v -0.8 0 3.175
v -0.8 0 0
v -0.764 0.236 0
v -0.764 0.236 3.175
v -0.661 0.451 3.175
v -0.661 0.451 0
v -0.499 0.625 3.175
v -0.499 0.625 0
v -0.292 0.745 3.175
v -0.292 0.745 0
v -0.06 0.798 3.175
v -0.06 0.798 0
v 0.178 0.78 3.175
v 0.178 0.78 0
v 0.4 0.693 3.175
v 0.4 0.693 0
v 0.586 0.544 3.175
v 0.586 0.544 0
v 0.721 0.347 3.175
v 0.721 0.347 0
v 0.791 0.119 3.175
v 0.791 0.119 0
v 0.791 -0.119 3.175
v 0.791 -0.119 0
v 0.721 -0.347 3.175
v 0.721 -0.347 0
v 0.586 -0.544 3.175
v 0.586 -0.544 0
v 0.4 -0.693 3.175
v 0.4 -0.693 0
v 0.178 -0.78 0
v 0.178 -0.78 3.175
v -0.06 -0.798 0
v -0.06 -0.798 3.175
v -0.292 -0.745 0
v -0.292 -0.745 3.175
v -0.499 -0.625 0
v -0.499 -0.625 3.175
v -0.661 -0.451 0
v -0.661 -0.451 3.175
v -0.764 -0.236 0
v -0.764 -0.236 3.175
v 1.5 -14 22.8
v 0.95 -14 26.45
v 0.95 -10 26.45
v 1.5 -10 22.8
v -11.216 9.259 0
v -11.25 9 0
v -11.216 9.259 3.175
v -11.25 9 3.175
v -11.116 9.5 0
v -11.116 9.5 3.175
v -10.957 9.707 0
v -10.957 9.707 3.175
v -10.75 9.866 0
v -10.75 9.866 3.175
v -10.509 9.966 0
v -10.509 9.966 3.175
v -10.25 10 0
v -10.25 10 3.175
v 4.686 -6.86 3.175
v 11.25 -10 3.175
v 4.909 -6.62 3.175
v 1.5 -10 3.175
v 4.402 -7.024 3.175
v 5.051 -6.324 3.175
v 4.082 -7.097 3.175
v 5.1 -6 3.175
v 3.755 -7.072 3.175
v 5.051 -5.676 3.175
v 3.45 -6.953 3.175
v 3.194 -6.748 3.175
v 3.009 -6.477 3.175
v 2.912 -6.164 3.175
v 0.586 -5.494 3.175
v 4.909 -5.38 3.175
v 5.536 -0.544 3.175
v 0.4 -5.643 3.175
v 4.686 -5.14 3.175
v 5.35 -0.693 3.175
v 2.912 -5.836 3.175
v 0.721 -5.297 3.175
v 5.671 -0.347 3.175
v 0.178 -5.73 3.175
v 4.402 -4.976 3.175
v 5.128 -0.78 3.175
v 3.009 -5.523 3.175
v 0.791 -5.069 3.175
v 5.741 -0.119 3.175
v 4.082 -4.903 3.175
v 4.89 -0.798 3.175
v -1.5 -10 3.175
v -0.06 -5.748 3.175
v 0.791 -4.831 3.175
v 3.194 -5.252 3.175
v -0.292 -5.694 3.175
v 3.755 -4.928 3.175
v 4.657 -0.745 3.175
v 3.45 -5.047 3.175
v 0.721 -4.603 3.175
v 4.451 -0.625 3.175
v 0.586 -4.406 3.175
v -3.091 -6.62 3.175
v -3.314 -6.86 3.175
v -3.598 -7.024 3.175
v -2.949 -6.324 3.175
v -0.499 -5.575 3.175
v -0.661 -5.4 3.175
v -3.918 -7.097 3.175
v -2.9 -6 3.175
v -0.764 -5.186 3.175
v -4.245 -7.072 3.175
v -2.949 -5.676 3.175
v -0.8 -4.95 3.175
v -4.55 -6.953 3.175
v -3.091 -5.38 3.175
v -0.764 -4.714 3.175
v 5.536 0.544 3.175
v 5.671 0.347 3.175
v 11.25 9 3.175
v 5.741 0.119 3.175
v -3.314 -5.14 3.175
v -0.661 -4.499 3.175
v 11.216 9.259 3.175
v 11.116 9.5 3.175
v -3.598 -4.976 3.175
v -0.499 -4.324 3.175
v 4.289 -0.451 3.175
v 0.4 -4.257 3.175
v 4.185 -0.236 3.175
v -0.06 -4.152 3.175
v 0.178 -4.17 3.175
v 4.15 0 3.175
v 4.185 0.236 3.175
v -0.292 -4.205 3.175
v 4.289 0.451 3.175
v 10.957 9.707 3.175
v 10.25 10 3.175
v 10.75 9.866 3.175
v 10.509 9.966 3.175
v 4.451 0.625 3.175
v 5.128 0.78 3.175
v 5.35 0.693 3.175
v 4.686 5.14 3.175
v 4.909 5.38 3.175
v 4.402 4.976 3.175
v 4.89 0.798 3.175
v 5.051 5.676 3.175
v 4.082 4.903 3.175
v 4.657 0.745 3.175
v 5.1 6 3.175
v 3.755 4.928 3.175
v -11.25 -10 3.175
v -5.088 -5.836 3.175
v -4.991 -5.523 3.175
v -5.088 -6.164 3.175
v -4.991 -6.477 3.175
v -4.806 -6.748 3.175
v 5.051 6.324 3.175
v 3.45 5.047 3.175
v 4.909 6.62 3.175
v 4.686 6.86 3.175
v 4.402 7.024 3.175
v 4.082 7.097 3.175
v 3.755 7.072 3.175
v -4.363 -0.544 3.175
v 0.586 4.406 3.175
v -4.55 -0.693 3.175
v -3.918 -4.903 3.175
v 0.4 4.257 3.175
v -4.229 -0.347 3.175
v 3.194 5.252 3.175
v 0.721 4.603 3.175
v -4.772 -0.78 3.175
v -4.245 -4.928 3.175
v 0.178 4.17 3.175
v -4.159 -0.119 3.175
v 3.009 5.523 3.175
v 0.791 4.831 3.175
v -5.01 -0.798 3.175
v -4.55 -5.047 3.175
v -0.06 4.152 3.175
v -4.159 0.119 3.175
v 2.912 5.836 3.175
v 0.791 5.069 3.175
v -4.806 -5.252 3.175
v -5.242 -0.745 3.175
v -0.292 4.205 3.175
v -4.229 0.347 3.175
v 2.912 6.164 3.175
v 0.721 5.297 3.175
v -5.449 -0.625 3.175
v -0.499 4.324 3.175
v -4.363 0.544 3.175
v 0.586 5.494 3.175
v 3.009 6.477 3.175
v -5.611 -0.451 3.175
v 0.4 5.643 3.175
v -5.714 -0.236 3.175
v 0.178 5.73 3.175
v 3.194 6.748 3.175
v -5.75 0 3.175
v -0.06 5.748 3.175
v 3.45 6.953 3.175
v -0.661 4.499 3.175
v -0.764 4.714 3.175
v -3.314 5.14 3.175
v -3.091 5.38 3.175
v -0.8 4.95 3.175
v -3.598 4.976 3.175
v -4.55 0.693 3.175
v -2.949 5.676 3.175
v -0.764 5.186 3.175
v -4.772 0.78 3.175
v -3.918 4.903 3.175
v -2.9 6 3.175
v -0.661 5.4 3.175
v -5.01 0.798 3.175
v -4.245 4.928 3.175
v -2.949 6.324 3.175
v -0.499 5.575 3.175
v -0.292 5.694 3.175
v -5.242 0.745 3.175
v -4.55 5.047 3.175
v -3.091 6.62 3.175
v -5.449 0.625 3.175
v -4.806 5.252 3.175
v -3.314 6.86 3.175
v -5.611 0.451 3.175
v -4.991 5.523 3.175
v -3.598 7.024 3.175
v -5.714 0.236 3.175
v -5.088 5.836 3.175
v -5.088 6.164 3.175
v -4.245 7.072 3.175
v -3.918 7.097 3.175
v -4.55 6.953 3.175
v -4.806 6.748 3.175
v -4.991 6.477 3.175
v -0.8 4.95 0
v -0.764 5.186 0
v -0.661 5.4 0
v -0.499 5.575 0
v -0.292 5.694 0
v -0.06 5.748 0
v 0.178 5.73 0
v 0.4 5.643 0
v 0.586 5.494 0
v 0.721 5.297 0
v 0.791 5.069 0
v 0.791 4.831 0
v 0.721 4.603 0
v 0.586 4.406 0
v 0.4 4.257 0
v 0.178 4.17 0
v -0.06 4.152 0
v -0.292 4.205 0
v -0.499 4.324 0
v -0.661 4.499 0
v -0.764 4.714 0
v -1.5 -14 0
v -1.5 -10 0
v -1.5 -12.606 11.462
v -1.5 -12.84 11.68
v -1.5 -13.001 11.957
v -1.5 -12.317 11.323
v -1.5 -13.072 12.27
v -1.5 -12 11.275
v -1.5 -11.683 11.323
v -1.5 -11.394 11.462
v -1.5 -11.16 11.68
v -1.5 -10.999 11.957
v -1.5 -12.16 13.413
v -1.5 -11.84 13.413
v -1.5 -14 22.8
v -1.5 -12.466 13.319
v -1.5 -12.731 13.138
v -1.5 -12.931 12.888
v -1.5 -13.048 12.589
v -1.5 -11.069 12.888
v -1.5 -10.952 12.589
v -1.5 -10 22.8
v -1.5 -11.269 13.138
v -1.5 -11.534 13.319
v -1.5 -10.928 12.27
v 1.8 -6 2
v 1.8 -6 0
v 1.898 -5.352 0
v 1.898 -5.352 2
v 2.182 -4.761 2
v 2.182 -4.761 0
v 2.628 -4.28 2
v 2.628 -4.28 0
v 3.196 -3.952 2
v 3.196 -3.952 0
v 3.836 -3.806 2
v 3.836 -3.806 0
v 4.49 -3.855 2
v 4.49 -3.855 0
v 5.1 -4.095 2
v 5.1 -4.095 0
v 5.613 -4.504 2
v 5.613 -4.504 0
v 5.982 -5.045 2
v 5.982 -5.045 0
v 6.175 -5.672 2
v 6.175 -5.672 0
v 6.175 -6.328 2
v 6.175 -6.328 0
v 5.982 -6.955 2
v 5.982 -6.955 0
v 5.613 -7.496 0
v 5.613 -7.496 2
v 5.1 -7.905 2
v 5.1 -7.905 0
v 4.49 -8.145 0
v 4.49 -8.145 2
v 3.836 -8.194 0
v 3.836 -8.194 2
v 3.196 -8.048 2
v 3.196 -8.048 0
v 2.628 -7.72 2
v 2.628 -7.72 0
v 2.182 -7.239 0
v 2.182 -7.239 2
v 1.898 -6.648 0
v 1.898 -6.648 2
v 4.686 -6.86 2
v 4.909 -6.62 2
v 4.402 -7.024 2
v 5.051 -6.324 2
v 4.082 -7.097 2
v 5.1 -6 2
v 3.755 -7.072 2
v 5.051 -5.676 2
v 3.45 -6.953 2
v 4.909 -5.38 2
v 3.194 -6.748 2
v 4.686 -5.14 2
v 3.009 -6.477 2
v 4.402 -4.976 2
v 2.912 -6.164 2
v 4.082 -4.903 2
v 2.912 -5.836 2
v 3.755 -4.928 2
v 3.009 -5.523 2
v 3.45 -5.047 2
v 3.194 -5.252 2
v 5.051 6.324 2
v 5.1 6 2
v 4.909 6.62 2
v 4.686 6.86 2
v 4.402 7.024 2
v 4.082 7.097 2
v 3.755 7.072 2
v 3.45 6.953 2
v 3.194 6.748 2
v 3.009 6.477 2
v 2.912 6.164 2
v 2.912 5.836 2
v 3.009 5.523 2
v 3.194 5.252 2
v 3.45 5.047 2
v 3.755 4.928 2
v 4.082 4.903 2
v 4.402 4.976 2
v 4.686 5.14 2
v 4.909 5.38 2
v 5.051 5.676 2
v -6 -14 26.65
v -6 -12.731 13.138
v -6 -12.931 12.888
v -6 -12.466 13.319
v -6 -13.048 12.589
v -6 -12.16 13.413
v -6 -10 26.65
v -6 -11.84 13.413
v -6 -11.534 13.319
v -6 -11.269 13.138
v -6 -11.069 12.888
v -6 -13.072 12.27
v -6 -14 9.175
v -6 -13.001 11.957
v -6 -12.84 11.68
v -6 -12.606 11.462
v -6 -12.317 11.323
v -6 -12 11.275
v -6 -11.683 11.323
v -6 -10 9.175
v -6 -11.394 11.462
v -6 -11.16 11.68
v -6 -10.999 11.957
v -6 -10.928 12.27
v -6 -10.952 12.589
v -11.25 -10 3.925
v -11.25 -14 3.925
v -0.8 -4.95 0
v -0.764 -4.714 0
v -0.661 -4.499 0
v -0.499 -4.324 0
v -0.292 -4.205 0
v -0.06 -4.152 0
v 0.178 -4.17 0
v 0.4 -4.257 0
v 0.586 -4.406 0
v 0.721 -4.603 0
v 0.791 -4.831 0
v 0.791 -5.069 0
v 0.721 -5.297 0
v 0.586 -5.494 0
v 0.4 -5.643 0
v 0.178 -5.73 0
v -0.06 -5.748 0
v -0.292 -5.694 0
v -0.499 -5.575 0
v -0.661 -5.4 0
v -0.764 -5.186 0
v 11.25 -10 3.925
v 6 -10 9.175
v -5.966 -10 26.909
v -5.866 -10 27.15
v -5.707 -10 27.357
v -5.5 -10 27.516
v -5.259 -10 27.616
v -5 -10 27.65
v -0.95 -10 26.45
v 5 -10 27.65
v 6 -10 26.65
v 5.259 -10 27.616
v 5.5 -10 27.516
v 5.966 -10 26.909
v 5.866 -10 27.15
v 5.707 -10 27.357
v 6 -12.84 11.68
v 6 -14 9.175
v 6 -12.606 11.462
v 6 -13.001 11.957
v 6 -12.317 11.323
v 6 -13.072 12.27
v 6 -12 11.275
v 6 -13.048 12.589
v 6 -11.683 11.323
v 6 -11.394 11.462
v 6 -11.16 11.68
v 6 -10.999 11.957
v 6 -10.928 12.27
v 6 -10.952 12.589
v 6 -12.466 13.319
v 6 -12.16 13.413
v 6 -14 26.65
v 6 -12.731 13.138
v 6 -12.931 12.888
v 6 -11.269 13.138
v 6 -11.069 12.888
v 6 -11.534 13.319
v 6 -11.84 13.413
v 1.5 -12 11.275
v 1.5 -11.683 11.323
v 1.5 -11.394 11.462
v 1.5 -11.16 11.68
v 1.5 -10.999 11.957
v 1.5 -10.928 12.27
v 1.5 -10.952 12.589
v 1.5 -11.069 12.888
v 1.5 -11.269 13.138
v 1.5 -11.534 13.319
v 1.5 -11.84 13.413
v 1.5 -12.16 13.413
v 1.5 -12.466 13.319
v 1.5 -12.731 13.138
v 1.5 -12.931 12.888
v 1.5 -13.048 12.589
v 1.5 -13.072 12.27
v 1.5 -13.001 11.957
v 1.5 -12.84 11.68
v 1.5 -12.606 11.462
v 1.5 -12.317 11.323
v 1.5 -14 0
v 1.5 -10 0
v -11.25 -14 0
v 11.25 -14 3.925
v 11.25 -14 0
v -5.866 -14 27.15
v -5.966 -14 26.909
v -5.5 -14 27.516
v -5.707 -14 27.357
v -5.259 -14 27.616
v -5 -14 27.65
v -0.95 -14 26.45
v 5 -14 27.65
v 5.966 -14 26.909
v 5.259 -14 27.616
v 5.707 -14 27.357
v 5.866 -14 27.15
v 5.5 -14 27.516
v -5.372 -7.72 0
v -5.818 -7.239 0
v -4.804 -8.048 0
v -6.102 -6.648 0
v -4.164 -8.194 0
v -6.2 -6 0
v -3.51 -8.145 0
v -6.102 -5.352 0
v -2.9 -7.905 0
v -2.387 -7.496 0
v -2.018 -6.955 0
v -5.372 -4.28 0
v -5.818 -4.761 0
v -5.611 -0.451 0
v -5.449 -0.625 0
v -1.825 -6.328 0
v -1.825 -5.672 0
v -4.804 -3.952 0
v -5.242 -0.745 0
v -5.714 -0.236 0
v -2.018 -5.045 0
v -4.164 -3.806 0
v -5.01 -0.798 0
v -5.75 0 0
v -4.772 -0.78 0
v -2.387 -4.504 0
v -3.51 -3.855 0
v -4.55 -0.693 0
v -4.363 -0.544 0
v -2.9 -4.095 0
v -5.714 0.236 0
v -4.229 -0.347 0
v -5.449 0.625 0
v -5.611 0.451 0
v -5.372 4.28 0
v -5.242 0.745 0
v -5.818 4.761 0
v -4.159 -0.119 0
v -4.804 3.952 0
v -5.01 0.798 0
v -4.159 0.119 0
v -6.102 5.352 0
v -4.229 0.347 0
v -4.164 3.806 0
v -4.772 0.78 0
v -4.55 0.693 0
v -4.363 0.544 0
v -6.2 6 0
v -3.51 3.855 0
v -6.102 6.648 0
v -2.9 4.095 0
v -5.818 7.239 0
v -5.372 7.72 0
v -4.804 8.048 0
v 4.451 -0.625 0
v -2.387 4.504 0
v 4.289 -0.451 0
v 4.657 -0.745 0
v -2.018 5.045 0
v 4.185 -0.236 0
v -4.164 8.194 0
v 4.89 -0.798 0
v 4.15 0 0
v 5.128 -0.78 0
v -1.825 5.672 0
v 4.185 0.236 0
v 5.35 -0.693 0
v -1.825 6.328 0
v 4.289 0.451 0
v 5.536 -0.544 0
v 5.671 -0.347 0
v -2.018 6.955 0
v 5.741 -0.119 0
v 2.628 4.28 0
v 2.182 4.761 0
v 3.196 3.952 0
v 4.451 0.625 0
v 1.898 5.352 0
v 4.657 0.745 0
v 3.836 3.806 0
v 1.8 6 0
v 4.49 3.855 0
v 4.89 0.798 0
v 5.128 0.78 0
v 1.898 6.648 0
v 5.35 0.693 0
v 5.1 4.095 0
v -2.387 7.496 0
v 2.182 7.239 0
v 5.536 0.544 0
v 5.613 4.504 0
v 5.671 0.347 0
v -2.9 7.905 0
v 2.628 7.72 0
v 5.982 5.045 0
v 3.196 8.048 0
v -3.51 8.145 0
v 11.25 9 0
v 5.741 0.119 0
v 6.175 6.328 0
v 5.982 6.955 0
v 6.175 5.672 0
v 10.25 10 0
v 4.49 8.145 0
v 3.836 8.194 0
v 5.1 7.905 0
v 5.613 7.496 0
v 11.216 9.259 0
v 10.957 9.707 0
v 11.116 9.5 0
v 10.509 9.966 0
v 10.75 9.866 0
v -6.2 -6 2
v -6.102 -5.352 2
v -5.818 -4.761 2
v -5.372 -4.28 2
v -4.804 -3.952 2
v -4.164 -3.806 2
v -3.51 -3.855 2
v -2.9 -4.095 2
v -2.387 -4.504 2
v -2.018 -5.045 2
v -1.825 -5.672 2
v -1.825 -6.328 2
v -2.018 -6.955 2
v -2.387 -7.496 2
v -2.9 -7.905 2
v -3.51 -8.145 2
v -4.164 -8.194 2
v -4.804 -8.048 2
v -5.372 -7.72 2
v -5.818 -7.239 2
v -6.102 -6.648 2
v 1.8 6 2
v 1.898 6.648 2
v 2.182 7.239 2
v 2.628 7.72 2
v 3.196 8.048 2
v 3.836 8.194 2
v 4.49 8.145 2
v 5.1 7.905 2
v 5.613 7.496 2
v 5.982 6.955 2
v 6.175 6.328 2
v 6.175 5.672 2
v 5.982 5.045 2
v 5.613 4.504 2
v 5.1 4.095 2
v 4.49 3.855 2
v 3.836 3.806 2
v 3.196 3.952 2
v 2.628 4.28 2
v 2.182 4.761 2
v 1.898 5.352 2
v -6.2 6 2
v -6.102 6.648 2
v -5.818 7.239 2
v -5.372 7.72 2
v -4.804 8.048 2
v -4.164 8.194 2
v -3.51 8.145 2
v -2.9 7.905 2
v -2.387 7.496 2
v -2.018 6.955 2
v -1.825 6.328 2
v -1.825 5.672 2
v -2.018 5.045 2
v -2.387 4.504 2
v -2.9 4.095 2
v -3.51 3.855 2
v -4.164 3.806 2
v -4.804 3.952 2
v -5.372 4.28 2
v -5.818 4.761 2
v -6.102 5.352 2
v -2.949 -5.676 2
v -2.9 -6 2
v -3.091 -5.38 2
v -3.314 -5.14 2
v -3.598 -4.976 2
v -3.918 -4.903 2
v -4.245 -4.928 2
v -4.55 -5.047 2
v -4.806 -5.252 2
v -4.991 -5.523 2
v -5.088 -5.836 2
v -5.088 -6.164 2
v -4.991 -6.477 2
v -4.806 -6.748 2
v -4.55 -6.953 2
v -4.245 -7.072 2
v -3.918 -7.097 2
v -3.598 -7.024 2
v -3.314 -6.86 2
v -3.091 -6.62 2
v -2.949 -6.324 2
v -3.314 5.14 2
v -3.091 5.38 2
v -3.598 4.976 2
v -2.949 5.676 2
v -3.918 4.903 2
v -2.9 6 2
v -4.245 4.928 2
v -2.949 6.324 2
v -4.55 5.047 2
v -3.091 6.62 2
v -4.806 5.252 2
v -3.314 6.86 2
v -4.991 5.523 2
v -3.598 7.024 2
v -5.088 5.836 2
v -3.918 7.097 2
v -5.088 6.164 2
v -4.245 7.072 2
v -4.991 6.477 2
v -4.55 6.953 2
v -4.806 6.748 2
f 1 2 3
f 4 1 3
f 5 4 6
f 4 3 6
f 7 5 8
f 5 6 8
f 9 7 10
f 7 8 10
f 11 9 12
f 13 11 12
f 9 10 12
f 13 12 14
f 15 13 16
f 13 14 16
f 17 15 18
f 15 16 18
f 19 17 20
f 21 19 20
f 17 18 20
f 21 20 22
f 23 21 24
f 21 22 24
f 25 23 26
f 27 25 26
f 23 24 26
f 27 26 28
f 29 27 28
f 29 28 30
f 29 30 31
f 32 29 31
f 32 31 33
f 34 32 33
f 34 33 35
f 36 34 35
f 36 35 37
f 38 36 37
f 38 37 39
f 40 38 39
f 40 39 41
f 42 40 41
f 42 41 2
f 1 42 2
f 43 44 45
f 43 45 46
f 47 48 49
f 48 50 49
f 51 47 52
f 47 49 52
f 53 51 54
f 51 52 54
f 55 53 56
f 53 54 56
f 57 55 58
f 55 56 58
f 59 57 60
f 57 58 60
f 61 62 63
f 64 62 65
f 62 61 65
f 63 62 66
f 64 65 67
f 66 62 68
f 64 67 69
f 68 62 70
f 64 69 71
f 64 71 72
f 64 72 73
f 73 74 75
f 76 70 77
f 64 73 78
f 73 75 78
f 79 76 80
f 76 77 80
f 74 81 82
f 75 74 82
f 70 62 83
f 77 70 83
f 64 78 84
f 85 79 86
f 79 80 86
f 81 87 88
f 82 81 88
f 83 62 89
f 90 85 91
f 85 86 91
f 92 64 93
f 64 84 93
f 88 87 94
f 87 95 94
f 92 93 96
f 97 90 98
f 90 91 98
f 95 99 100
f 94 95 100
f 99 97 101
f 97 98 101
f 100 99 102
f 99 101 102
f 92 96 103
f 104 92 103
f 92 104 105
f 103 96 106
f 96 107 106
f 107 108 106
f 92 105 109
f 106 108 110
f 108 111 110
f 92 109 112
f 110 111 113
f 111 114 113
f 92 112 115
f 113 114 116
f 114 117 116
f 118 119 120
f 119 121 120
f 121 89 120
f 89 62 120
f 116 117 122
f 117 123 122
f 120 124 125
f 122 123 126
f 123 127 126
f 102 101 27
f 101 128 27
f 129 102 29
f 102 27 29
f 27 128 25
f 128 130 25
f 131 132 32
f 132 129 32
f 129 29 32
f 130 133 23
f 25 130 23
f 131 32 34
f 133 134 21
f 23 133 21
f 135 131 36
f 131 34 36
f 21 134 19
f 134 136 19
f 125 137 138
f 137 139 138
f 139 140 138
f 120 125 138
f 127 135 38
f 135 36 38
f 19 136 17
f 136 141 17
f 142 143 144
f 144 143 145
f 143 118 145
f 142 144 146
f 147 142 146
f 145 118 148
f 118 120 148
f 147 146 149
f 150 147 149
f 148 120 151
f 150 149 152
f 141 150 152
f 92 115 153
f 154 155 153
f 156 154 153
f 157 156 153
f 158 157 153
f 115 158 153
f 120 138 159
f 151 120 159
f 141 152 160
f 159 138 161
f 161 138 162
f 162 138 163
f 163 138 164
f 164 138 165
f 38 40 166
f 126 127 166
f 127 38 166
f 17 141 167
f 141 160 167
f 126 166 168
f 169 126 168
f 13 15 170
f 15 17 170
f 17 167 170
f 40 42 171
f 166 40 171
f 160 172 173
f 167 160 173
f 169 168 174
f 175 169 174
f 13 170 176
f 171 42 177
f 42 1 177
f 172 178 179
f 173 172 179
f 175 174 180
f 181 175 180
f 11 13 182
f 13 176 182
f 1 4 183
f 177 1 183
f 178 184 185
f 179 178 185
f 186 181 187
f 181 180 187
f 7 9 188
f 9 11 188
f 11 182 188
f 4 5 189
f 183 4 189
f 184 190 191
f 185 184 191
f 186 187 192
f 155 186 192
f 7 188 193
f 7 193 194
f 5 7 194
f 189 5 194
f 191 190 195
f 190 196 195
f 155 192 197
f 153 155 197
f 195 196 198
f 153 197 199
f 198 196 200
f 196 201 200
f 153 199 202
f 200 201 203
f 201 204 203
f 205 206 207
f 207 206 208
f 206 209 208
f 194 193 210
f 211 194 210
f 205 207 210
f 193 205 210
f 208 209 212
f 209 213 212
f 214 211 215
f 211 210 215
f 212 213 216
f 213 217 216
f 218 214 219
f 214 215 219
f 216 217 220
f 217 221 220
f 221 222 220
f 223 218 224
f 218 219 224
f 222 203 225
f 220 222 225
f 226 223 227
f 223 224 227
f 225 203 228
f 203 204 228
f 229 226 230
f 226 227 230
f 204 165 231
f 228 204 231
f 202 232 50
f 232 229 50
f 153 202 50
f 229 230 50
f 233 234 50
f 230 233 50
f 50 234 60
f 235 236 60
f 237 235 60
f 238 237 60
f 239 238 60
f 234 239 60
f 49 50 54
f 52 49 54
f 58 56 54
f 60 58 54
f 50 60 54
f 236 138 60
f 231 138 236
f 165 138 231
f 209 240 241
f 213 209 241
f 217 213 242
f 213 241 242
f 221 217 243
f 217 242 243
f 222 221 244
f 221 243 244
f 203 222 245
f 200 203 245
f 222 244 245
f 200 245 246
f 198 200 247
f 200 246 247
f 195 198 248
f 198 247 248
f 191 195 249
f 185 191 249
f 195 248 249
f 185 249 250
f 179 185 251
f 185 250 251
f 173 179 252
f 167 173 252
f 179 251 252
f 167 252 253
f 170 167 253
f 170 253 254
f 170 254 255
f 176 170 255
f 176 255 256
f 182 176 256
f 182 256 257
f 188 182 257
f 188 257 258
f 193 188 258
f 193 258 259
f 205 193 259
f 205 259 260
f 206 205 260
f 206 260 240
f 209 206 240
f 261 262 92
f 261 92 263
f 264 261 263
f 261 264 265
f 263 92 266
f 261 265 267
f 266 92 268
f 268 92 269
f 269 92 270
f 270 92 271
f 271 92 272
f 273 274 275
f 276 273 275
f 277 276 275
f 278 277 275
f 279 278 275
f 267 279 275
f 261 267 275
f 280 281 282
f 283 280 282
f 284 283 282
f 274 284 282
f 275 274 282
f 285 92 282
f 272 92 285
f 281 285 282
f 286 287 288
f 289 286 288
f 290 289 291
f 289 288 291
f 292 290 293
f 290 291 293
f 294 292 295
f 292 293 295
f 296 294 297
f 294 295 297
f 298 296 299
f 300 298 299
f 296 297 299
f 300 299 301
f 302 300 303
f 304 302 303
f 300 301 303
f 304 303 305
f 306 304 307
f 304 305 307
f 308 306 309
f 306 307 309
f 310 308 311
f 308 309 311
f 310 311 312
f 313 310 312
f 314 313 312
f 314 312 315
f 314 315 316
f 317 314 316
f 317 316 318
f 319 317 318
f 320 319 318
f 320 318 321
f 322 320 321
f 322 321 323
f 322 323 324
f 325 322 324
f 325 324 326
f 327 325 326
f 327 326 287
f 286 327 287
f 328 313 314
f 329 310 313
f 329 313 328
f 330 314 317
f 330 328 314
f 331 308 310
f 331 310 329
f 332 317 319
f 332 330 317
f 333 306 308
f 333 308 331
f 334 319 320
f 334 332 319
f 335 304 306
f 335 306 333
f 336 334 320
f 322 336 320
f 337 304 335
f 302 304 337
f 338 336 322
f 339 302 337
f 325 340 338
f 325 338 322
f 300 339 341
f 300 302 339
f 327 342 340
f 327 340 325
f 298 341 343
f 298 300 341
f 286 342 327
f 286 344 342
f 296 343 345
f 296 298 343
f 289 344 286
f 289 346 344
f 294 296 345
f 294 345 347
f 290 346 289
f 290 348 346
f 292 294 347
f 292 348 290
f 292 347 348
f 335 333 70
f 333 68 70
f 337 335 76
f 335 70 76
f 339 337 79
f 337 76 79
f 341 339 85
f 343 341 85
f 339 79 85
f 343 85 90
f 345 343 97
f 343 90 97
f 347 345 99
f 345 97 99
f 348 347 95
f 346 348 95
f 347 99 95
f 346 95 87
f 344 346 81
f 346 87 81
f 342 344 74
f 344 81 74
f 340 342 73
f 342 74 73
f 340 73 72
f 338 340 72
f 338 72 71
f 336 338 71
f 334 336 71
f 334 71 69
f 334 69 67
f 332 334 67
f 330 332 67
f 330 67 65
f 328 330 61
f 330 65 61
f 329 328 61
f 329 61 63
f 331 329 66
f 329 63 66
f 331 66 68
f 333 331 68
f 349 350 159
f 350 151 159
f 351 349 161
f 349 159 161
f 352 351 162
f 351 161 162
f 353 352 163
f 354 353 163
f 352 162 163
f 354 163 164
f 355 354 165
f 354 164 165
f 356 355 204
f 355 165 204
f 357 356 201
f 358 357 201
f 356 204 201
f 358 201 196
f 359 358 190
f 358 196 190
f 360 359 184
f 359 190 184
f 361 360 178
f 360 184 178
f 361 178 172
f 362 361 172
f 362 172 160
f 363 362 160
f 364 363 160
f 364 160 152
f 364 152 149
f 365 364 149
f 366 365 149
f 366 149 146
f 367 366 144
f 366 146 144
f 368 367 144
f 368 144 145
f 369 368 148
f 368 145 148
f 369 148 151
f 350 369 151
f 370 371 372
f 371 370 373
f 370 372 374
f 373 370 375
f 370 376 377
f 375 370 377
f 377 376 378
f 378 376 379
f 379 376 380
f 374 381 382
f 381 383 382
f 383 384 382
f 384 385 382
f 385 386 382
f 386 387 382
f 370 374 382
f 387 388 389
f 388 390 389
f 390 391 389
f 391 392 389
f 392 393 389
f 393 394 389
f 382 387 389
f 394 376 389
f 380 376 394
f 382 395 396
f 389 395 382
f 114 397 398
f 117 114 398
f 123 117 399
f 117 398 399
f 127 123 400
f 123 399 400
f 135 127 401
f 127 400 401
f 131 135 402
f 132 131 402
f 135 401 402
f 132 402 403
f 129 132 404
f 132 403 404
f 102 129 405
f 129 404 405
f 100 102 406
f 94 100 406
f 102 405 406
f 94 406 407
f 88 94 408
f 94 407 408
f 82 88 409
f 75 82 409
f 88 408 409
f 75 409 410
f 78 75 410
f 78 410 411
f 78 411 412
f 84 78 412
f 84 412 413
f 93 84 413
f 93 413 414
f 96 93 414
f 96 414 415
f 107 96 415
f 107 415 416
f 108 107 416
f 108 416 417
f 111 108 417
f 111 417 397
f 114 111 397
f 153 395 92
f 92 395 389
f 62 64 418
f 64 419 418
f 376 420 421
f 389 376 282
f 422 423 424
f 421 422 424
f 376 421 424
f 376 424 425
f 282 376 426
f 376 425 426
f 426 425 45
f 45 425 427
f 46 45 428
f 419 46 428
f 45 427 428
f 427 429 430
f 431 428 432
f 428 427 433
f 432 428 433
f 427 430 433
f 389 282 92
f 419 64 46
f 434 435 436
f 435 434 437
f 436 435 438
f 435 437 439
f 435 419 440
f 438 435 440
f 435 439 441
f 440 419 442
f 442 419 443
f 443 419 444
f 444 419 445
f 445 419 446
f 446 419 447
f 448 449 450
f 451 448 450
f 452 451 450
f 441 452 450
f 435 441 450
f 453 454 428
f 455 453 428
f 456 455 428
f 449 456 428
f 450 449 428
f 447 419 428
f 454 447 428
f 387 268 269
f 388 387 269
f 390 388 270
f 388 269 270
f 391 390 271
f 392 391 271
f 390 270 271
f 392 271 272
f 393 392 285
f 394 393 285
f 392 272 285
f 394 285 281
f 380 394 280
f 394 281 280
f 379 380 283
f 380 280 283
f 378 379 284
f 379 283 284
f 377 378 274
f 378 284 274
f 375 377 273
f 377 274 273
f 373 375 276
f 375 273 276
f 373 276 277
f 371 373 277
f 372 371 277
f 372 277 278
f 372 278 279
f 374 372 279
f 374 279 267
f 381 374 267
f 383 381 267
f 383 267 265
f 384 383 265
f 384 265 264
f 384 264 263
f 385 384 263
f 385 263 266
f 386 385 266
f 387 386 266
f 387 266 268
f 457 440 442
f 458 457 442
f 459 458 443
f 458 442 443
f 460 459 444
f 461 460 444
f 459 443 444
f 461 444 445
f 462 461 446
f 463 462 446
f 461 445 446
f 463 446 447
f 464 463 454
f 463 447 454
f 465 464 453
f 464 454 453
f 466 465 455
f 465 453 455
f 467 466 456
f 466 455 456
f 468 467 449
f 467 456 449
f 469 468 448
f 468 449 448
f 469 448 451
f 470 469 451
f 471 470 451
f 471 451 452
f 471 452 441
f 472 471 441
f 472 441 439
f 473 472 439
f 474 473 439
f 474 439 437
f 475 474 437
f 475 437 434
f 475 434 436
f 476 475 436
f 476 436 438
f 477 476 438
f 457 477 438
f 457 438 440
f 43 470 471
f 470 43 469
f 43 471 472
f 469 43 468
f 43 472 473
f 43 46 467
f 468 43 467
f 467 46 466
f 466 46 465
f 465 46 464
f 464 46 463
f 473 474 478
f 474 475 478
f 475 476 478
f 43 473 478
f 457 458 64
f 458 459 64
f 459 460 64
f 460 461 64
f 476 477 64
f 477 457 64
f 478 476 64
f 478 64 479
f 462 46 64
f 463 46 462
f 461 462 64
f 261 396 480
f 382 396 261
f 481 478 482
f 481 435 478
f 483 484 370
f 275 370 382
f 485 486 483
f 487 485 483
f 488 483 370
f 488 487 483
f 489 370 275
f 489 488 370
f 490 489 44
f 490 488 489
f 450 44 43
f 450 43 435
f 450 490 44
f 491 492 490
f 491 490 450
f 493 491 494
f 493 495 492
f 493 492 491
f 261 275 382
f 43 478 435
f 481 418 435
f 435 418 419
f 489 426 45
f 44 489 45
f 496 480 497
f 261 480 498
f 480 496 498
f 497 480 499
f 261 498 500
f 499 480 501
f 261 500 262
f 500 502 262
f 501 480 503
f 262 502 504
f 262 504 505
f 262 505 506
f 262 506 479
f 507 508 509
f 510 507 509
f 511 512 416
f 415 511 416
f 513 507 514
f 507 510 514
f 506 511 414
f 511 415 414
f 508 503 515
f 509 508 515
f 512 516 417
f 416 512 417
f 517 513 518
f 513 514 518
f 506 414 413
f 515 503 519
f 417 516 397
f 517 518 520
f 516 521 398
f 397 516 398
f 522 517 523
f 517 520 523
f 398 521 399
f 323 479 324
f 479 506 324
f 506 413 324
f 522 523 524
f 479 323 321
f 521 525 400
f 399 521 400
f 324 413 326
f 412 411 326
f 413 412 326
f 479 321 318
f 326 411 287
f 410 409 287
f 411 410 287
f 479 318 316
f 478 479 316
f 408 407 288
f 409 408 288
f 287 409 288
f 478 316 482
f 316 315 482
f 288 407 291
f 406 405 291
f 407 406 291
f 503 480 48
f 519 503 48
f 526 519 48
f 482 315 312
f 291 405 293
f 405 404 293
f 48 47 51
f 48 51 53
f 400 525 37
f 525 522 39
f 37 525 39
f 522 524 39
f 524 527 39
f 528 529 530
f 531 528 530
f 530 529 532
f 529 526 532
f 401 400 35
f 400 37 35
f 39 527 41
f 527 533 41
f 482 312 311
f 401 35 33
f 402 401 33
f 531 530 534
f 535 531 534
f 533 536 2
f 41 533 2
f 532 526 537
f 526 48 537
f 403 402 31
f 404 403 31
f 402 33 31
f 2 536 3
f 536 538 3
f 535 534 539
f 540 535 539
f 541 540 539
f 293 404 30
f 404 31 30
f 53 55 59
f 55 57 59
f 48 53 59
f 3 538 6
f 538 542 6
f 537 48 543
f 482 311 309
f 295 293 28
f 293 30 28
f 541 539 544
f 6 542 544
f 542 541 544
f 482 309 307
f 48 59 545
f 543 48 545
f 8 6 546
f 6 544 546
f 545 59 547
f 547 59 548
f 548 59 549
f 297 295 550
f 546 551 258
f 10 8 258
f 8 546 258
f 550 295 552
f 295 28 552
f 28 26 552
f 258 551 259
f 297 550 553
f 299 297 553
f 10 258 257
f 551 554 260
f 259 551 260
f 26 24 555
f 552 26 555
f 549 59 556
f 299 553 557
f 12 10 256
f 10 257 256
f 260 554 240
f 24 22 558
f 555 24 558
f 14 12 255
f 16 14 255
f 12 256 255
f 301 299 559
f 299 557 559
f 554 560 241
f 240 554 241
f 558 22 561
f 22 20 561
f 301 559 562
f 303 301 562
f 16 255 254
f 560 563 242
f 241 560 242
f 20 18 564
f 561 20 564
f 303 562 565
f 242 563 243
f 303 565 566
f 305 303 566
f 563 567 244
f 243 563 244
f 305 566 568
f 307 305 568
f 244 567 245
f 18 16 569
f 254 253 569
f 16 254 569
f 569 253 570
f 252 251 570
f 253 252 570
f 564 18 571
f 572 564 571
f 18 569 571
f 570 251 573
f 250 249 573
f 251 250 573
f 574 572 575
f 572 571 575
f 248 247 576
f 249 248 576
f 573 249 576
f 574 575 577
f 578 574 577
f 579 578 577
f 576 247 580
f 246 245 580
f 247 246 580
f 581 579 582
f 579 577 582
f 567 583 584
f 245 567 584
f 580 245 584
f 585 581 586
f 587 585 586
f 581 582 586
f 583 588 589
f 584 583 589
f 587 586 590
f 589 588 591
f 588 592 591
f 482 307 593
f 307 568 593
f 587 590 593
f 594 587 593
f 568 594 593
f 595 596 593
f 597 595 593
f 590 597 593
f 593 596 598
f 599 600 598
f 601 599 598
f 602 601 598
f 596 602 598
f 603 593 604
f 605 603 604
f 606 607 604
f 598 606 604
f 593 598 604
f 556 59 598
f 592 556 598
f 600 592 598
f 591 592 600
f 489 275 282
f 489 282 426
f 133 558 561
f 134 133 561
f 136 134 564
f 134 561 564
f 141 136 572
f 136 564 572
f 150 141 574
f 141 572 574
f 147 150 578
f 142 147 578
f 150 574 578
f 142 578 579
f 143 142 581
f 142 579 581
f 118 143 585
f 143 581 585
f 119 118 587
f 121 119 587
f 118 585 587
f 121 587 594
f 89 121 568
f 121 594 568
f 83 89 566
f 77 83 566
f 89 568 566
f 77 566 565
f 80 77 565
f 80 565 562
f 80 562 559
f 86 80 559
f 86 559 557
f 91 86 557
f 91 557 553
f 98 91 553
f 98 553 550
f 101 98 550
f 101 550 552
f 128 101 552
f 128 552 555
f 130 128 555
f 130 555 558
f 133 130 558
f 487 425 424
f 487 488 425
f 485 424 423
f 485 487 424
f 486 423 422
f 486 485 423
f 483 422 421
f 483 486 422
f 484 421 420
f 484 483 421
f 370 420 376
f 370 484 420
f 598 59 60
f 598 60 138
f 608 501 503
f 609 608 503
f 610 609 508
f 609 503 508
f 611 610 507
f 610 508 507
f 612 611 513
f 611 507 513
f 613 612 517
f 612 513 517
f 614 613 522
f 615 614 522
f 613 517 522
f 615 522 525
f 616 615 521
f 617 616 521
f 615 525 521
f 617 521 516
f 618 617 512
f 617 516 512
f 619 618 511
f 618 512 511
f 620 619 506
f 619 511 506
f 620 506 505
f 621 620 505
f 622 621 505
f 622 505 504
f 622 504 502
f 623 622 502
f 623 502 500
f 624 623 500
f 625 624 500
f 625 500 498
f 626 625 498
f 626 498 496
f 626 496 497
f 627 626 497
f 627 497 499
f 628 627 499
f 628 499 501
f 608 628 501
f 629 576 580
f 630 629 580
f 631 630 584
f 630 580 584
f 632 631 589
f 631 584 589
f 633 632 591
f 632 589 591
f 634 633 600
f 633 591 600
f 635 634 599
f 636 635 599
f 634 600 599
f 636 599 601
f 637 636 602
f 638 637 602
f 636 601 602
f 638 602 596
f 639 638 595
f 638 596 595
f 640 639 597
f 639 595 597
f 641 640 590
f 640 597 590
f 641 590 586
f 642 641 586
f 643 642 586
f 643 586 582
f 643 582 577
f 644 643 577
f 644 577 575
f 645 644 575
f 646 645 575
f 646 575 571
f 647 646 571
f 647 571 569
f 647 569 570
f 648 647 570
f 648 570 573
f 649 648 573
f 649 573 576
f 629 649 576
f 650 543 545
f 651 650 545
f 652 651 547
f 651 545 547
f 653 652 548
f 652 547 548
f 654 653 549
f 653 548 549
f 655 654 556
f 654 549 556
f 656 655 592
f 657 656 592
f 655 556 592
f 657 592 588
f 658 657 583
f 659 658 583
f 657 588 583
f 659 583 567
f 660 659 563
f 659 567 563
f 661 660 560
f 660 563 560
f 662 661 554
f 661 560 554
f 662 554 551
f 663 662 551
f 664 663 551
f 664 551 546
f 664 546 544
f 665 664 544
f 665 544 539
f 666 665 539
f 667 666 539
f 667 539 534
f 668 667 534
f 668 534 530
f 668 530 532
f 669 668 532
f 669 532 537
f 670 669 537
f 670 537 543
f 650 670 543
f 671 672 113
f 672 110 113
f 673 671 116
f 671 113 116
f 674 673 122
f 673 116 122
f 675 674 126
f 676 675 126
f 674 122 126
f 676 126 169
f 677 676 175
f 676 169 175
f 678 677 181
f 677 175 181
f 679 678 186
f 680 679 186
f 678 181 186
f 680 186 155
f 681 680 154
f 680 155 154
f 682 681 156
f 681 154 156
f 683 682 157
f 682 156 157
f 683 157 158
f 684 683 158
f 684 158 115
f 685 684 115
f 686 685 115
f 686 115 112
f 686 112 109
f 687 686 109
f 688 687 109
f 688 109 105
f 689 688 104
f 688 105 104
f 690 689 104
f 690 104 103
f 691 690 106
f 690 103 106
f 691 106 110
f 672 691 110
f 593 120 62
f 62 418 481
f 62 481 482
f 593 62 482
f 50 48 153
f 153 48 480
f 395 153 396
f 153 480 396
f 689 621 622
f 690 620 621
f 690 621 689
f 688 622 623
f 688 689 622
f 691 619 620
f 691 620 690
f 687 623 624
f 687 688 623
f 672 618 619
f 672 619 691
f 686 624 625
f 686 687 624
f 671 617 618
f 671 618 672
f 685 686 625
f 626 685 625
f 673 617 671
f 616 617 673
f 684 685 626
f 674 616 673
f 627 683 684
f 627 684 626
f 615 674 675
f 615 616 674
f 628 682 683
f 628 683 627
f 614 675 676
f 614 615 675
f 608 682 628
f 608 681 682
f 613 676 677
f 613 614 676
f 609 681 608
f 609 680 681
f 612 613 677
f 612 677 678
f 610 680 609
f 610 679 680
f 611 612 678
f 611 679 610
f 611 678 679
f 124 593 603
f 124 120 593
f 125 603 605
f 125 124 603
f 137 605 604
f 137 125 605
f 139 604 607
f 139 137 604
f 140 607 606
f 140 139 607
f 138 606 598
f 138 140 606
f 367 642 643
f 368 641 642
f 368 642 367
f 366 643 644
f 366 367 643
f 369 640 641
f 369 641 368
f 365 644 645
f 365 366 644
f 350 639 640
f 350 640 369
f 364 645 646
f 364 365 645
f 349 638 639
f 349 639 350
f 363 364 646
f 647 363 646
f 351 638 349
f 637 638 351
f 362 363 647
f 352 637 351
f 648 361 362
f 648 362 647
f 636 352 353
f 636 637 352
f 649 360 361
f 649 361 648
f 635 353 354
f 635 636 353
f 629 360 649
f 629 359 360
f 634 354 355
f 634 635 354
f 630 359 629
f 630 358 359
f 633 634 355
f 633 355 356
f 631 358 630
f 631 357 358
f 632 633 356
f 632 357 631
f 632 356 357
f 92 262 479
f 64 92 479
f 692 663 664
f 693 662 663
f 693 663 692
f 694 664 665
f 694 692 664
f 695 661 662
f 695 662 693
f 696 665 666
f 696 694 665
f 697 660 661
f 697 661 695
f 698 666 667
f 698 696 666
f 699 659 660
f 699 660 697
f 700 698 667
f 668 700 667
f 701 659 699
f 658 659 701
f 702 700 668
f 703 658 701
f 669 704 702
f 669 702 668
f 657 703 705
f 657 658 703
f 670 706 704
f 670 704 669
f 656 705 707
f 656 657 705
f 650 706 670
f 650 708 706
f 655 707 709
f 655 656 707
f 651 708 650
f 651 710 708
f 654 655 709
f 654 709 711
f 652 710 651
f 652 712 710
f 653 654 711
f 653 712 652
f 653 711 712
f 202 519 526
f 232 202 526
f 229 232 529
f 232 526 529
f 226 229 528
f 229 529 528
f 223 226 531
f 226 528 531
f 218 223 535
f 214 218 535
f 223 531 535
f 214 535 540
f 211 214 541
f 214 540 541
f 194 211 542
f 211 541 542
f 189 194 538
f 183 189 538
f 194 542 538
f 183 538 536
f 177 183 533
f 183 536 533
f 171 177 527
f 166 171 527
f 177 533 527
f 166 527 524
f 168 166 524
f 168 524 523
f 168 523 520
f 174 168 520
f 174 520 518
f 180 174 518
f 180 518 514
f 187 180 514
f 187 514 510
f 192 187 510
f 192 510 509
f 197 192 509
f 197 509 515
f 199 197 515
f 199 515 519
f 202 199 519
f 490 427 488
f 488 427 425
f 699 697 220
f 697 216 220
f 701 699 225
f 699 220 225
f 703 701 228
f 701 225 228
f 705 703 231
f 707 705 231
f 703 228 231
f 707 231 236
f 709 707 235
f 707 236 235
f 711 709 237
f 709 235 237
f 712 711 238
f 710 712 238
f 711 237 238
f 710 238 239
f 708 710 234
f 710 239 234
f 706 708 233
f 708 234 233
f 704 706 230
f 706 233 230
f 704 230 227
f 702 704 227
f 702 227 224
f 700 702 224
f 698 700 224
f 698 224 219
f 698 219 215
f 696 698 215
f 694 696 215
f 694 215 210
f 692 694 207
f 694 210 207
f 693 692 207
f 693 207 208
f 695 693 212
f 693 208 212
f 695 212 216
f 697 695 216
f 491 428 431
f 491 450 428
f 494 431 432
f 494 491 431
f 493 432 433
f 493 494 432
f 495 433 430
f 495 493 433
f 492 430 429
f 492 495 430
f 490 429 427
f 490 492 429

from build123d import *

# Parameters (mm, degrees)
SKETCH1_W                      = 22.5
SKETCH1_H                      = 20
BOSS_EXTRUDE1_DEPTH            = 3.175
TAP_DRILL_FOR_M2X0_4_TAP2_D    = 1.6
BOSS_EXTRUDE2_DEPTH            = 4
CHAMFER1_SIZE                  = 6
M2_CLEARANCE_HOLE1_D           = 2.15
FILLET1_R                      = 1
CBORE_FOR_M2_SHCS1_D           = 2.2
CBORE_FOR_M2_SHCS1_CBORE_D     = 4.4
CBORE_FOR_M2_SHCS1_CBORE_DEPTH = 2


with BuildPart() as part:
    # Sketch1 → Boss-Extrude1 (new body)
    with BuildSketch(Plane.XY):
        Rectangle(SKETCH1_W, SKETCH1_H)
    extrude(amount=BOSS_EXTRUDE1_DEPTH)

    # Tap Drill for M2x0.4 Tap2 (through all)
    with Locations(Plane.XY.offset(3.175)):
        with Locations((0, 0), (-4.949747468, 0), (0, -4.949747468), (4.949747468, 0), (0, 4.949747468)):
            Hole(TAP_DRILL_FOR_M2X0_4_TAP2_D / 2)

    # Sketch10 → Boss-Extrude2 (add)
    with BuildSketch(Plane.XZ.offset(10)):
        Polygon((6, 27.65), (-6, 27.65), (-6, 3.175), (-11.25, 3.175), (-11.25, 0), (-1.5, 0), (-1.5, 22.8), (-0.95, 26.45), (0.95, 26.45), (1.5, 22.8), (1.5, 0), (11.25, 0), (11.25, 3.175), (6, 3.175), align=None)
    extrude(amount=BOSS_EXTRUDE2_DEPTH)

    # Chamfer1
    # the kernel refuses this chamfer: 6 mm, written as the material it adds along each edge
    with BuildSketch(Plane(origin=(-6, -10, 3.175), x_dir=(-0.9996219169112969, 0, -0.02749587661058649), z_dir=(0, -1, 0))) as chamfer1_piece_1_section:
        Polygon((CHAMFER1_SIZE * 0.999621916911, -CHAMFER1_SIZE * 0.0274958766106), (-CHAMFER1_SIZE * 0.0274958766106, -CHAMFER1_SIZE * 0.999621916911), (0, 0), align=None)
    chamfer1_piece_1 = extrude(amount=4, mode=Mode.PRIVATE)
    chamfer1_piece_1 = split(chamfer1_piece_1, bisect_by=Plane(origin=(-11.25, -12, 5.202939), z_dir=(1, 0, 0)), keep=Keep.TOP, mode=Mode.PRIVATE)
    add(chamfer1_piece_1)
    with BuildSketch(Plane(origin=(6, -10, 3.175), x_dir=(0.9996219169112969, 0, -0.02749587661058649), z_dir=(0, -1, 0))) as chamfer1_piece_2_section:
        Polygon((CHAMFER1_SIZE * 0.999621916911, CHAMFER1_SIZE * 0.0274958766106), (-CHAMFER1_SIZE * 0.0274958766106, CHAMFER1_SIZE * 0.999621916911), (0, 0), align=None)
    chamfer1_piece_2 = extrude(amount=4, mode=Mode.PRIVATE)
    chamfer1_piece_2 = split(chamfer1_piece_2, bisect_by=Plane(origin=(11.25, -12, 5.202939), z_dir=(-1, 0, 0)), keep=Keep.TOP, mode=Mode.PRIVATE)
    add(chamfer1_piece_2)

    # M2 Clearance Hole1 (through all)
    with Locations(Plane.ZY.offset(11.25)):
        with Locations((12.35, -12)):
            Hole(M2_CLEARANCE_HOLE1_D / 2)

    # Fillet1
    fillet1_edges = [part.edges().sort_by_distance(p)[0] for p in [
        (6, -12, 27.65),
        (-6, -12, 27.65),
        (-11.25, 10, 1.5875),
        (11.25, 10, 1.5875),
    ]]
    fillet(fillet1_edges, radius=FILLET1_R)

    # CBORE for M2 SHCS1 (through all)
    with Locations(Plane(origin=(0, 0, 0), x_dir=(-1, 0, 0), z_dir=(0, 0, -1))):
        with Locations((4, -6), (-4, 6), (-4, -6), (4, 6)):
            CounterBoreHole(CBORE_FOR_M2_SHCS1_D / 2, CBORE_FOR_M2_SHCS1_CBORE_D / 2, CBORE_FOR_M2_SHCS1_CBORE_DEPTH)


solid = part.part
